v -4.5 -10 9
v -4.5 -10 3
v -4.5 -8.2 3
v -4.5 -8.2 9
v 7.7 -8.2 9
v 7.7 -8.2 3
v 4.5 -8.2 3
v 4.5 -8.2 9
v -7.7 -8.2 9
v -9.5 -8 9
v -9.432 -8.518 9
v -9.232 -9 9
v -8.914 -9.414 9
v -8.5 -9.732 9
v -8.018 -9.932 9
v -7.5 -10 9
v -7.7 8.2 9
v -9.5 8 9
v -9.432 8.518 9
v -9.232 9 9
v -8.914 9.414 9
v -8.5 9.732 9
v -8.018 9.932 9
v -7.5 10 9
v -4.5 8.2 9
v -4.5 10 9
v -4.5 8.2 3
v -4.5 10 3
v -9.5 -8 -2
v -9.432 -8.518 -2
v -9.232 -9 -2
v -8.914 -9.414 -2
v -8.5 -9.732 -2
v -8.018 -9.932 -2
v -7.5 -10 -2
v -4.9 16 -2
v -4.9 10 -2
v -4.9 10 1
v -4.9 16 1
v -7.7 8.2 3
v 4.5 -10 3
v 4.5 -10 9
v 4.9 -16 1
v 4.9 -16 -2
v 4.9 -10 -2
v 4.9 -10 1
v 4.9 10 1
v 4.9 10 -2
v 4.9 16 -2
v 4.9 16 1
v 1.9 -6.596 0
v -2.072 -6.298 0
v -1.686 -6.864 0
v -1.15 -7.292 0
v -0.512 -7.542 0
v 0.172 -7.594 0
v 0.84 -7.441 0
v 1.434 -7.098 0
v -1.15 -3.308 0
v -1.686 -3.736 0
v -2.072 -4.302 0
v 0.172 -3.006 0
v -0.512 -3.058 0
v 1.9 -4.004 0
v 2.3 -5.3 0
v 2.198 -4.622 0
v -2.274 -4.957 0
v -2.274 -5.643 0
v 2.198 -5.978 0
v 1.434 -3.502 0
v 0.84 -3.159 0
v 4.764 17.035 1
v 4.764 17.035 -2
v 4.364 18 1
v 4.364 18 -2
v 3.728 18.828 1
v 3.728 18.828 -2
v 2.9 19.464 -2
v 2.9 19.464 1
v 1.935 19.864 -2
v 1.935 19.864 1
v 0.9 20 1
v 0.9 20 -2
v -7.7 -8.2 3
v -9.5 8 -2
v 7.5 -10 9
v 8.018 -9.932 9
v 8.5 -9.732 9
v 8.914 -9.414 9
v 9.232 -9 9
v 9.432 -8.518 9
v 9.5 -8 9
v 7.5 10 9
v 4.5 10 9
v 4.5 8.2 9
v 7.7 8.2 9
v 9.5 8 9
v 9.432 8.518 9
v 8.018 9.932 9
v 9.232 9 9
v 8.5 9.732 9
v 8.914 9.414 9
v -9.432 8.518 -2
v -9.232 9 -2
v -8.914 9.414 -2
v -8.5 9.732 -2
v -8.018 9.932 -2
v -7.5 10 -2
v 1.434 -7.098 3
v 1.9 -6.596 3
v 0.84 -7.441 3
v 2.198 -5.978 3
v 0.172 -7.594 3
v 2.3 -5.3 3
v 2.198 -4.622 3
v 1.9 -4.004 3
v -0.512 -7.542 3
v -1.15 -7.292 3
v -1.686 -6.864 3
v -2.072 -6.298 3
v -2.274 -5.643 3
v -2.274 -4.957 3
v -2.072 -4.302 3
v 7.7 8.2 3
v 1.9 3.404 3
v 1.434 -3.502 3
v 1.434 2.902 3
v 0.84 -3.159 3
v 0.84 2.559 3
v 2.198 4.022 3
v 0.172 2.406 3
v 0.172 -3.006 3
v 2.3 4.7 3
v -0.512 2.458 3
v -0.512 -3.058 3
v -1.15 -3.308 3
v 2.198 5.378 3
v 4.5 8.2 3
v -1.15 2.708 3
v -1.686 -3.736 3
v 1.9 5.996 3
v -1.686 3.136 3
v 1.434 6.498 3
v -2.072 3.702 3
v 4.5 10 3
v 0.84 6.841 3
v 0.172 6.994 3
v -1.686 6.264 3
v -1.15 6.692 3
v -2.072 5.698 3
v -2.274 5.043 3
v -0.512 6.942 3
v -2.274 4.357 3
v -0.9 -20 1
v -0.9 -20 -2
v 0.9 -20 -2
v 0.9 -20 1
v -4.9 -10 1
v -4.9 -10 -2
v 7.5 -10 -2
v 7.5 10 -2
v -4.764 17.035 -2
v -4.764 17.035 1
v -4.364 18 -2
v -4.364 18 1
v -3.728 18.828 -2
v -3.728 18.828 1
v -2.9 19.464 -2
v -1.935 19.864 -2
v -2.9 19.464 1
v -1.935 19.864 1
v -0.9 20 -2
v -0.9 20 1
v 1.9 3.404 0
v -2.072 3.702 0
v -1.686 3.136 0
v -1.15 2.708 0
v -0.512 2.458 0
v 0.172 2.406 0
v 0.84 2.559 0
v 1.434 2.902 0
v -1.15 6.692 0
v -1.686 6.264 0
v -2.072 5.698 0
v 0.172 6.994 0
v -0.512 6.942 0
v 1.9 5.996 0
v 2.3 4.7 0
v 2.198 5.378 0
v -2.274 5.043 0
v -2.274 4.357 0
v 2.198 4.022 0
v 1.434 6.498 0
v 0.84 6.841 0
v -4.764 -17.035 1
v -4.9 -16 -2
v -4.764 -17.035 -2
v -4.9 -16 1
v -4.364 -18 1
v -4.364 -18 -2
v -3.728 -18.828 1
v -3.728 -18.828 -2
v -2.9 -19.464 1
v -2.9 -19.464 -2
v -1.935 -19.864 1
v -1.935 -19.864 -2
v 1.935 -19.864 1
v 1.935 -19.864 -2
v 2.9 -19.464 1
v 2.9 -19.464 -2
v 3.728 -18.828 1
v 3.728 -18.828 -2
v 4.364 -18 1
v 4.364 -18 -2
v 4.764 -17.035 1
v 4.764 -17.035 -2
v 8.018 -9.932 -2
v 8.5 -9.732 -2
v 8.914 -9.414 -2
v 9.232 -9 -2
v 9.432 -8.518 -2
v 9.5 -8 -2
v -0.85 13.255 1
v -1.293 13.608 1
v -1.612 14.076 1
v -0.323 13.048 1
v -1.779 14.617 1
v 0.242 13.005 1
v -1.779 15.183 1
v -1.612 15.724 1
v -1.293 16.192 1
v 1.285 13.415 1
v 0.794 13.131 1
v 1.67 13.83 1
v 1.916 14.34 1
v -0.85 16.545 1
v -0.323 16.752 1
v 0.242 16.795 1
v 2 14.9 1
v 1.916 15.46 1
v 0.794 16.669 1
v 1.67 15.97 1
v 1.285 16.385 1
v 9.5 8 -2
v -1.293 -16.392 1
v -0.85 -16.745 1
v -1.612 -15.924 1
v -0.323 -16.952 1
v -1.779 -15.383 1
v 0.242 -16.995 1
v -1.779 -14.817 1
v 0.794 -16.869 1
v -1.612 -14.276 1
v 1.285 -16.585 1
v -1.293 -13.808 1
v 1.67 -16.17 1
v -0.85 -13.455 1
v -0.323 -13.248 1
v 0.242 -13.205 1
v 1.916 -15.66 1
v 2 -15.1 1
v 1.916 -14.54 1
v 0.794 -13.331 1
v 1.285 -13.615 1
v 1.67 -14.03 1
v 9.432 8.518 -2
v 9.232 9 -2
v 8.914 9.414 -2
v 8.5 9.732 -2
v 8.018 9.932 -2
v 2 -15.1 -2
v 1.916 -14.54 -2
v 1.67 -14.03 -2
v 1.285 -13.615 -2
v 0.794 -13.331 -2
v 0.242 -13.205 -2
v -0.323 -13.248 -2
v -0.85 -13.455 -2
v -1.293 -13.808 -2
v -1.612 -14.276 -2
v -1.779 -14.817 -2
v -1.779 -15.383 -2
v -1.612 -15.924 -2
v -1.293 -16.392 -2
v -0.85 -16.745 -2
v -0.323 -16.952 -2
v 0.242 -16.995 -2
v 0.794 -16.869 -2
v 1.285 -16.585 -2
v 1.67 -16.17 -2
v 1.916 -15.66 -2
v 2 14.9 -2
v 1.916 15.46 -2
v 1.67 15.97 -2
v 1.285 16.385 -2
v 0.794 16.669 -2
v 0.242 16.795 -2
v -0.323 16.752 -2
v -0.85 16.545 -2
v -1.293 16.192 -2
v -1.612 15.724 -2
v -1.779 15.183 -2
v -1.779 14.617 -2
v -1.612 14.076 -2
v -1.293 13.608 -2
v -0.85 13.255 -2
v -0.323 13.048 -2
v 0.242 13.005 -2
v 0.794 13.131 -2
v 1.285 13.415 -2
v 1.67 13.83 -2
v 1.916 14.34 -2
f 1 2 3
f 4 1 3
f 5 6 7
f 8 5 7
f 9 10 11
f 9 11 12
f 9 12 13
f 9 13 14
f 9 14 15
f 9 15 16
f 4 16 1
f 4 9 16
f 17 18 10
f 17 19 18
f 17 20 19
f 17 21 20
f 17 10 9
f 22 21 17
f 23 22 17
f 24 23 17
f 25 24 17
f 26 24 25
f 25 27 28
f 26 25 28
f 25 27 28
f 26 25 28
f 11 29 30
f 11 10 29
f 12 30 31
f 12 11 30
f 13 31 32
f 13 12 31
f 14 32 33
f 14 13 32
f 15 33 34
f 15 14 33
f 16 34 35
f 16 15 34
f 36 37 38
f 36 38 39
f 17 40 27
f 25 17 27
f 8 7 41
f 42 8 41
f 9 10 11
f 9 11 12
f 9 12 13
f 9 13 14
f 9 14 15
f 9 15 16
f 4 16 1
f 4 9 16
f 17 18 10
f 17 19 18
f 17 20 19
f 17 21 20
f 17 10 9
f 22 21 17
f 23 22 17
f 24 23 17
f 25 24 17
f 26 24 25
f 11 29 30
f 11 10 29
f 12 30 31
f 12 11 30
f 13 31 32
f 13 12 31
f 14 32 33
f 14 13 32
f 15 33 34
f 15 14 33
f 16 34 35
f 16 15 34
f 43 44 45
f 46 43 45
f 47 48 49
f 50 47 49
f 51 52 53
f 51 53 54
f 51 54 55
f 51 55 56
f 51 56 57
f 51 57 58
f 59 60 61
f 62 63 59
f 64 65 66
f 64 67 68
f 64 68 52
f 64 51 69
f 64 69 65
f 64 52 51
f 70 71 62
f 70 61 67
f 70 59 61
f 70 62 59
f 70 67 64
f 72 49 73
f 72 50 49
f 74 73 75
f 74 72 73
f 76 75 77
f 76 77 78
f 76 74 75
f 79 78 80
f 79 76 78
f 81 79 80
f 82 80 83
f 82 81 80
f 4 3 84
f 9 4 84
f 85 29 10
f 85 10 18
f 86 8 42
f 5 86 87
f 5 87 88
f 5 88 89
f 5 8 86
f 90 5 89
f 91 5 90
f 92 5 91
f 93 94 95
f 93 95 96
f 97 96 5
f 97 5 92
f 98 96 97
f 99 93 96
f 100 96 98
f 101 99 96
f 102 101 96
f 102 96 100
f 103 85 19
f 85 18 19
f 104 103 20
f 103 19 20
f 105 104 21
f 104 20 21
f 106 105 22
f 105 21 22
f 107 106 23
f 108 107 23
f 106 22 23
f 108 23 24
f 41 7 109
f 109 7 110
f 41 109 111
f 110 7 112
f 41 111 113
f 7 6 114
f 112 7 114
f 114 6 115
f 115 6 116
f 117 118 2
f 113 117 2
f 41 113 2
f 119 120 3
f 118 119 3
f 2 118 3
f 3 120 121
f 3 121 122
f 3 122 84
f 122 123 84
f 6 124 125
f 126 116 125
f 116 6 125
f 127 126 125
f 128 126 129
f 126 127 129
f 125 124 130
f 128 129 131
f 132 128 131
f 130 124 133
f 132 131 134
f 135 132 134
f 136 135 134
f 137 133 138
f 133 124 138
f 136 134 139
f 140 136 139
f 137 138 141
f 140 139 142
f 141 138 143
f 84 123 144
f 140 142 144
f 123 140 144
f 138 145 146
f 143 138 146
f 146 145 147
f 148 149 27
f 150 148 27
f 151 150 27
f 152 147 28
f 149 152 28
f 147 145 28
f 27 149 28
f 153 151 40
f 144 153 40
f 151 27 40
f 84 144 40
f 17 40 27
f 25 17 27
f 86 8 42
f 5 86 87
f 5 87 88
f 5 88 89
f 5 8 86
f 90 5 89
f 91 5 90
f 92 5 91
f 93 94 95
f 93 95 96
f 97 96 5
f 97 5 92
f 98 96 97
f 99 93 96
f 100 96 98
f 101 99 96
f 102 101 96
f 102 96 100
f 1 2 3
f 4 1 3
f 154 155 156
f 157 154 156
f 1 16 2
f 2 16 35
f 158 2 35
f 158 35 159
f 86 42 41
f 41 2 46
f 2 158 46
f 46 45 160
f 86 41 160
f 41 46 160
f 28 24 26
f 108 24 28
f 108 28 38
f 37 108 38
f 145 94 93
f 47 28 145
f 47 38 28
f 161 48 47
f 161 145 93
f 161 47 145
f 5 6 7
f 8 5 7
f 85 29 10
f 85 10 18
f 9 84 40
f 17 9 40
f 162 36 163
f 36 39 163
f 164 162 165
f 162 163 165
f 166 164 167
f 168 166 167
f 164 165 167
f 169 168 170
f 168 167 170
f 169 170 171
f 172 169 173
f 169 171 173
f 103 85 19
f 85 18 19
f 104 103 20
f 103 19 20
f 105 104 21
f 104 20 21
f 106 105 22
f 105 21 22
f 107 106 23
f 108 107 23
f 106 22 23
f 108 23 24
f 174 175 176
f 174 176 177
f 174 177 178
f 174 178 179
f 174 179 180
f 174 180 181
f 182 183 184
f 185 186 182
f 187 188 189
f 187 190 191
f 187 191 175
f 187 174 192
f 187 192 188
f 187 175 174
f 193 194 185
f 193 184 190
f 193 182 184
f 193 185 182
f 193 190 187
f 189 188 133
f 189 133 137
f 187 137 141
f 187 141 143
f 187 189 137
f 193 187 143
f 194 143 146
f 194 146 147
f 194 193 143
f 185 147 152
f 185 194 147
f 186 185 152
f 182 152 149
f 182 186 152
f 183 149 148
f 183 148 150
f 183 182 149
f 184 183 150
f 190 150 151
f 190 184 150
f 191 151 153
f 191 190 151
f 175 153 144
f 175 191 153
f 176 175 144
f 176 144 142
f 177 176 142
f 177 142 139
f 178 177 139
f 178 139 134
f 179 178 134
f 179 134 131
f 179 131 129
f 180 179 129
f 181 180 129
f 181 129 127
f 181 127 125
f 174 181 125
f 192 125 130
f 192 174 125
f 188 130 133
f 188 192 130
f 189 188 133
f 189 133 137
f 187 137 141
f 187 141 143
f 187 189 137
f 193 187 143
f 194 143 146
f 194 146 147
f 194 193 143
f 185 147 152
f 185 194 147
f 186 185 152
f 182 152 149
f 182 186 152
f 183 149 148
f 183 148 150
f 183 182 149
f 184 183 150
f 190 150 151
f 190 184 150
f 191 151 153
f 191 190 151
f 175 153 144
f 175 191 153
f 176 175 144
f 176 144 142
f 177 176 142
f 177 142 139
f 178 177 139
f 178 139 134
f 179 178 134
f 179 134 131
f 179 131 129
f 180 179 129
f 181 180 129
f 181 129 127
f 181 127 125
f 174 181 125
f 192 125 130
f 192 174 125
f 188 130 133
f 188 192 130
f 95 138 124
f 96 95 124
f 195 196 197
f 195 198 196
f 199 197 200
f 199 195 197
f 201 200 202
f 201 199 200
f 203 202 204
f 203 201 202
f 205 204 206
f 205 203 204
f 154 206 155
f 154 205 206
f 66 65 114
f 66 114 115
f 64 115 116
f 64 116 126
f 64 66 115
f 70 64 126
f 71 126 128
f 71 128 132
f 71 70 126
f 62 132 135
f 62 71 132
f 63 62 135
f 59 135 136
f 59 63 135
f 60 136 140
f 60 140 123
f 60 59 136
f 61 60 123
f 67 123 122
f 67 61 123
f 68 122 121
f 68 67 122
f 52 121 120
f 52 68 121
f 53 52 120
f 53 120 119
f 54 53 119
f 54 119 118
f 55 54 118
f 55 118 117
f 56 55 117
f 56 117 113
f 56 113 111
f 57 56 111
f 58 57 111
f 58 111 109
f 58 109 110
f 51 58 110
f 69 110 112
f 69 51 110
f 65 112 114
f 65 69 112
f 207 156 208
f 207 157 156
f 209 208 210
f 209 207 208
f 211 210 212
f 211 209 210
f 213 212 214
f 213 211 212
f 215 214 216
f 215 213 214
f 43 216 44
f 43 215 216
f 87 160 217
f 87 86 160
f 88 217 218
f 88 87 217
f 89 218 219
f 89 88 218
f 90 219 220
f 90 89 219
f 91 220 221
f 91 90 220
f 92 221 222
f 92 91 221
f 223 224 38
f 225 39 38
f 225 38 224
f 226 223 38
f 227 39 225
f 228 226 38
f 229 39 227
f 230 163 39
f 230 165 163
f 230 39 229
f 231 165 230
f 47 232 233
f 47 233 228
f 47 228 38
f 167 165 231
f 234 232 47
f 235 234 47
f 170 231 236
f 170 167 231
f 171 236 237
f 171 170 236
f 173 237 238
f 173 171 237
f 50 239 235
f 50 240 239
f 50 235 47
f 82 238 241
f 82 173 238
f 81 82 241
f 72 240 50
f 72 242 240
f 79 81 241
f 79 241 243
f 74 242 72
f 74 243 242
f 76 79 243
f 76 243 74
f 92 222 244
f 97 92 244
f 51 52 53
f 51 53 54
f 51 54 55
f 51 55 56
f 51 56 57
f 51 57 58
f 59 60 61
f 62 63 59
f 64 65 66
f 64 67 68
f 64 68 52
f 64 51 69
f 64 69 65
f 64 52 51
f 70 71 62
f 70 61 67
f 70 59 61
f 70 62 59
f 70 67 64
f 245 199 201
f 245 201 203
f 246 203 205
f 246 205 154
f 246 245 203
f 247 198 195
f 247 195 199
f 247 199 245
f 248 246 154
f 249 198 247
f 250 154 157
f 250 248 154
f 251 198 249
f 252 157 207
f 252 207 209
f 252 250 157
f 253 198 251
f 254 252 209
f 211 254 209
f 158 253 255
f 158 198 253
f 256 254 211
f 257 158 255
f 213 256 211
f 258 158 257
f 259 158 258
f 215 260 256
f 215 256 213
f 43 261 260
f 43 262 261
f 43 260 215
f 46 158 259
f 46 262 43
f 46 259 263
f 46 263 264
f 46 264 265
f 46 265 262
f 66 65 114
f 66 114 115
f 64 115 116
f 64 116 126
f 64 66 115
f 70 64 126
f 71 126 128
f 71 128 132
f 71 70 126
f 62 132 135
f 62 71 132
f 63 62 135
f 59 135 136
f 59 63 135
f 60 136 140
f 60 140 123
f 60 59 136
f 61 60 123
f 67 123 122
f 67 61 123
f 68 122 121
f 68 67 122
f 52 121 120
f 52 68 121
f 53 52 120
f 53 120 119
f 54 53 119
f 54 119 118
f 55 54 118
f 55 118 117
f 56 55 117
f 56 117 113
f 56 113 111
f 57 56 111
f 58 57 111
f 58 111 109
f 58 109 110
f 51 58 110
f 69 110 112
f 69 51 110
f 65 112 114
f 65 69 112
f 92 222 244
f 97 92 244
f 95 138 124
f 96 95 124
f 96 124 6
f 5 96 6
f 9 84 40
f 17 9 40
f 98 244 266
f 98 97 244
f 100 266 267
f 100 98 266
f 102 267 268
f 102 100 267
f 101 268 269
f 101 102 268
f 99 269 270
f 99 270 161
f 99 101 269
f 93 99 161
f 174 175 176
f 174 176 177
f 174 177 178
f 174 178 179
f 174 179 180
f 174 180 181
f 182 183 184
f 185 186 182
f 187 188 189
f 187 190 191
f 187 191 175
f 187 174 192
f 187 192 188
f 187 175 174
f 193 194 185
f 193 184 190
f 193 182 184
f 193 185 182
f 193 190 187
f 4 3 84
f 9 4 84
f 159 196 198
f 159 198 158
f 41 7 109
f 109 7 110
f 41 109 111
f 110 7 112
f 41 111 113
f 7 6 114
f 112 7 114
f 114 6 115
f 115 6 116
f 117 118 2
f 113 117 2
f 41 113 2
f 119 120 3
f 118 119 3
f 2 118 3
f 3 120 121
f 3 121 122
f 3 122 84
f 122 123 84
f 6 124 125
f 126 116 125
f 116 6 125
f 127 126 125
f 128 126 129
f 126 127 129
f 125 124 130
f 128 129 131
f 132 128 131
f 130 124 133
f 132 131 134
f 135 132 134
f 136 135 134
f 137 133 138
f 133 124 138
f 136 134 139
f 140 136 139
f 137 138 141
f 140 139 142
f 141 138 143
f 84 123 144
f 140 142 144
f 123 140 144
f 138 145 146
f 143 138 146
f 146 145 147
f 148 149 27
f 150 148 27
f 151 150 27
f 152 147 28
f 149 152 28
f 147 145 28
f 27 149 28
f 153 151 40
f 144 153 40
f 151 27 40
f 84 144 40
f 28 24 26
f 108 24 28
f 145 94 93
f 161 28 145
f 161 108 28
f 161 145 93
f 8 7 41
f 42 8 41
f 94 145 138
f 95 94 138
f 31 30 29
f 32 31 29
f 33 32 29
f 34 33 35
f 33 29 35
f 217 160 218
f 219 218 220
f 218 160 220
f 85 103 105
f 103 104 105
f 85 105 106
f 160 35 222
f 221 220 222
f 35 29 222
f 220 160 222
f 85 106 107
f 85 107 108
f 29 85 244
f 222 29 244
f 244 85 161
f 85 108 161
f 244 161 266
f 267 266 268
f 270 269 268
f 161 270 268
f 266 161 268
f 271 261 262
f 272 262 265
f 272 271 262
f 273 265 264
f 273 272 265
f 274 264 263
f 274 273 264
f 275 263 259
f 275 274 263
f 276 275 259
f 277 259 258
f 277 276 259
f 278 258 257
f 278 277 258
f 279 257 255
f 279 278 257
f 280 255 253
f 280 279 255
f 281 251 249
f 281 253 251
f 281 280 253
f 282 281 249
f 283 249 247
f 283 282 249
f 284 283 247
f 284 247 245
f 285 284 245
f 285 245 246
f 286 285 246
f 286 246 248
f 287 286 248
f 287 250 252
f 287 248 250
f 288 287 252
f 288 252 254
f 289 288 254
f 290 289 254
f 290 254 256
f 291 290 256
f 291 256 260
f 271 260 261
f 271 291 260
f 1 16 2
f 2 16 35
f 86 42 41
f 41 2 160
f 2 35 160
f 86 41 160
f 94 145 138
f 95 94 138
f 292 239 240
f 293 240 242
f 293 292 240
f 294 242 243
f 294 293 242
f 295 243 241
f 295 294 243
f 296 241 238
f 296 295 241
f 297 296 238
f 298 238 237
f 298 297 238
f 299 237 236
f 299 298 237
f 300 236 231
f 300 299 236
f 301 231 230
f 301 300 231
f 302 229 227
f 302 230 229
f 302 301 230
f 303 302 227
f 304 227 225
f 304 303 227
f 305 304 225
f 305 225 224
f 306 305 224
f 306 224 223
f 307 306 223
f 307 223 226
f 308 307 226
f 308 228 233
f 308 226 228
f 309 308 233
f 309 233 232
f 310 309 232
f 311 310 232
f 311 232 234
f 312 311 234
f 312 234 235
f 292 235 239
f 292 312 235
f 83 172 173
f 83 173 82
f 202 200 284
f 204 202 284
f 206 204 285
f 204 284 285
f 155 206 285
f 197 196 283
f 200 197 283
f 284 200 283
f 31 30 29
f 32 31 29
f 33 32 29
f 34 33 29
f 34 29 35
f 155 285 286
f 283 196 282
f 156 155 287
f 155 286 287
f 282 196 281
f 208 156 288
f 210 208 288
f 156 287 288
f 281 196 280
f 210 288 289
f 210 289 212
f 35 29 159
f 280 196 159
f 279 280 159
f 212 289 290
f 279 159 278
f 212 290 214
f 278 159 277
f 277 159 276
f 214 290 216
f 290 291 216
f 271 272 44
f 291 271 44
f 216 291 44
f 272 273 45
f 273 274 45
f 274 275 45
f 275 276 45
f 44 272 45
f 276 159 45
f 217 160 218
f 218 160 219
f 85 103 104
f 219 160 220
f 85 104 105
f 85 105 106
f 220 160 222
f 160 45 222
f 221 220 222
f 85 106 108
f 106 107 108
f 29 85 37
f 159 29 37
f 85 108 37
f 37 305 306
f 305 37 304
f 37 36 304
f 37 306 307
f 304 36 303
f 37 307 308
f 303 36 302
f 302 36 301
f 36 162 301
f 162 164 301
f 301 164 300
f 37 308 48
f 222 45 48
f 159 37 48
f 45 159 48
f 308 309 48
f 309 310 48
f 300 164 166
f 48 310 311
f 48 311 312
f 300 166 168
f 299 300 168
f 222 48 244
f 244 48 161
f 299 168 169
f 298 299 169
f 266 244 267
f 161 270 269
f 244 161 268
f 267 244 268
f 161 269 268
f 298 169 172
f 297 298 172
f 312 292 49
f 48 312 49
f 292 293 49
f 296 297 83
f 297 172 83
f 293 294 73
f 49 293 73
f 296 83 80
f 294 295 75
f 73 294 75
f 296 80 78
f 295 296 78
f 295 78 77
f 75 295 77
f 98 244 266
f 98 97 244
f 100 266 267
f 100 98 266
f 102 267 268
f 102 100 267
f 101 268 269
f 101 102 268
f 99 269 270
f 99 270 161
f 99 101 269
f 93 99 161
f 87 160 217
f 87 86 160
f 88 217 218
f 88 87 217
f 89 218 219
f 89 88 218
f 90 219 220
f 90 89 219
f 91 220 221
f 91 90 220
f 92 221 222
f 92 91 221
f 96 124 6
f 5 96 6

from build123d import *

# Parameters (mm, degrees)
PAD_DEPTH         = 10
CYLINDER_R        = 2.3
CYLINDER_DEPTH    = 3
ARRAY_Y_COUNT     = 2
ARRAY_Y_PITCH     = 10
BOX_W             = 19
BOX_H             = 20
BOX_DEPTH         = 11
FILLET_R          = 2
CYLINDER001_R     = 1.9
CYLINDER001_DEPTH = 10
ARRAY002_Y_COUNT  = 2
ARRAY002_Y_PITCH  = 30
BOX005_W          = 9.8
BOX005_H          = 40
BOX005_DEPTH      = 3
FILLET002_R       = 4


with BuildPart() as tiny_bb_body:
    # Sketch → Pad (new body)
    with BuildSketch(Plane.XY):
        Polygon((-4.5, 10.3), (4.5, 10.3), (4.5, 8.2), (7.7, 8.2), (7.7, -8.2), (4.5, -8.2), (4.5, -10.3), (-4.5, -10.3), (-4.5, -8.2), (-7.7, -8.2), (-7.7, 8.2), (-4.5, 8.2), align=None)
    extrude(amount=PAD_DEPTH)


with BuildPart() as tiny_bb_body_1:
    # Body placement: moved
    add(tiny_bb_body.part.moved(Location((0, 0, 3))))


with BuildPart() as tiny_bb_mockup:
    # Cylinder → Cylinder (new body)
    with BuildSketch(Plane.XY):
        Circle(CYLINDER_R)
    extrude(amount=CYLINDER_DEPTH)

    # Array Y: tiny bb mockup ×2


with BuildPart() as tiny_bb_mockup_1:
    add(tiny_bb_mockup.part)
    with Locations(*[(0, i * ARRAY_Y_PITCH, 0) for i in range(1, ARRAY_Y_COUNT)]):
        add(tiny_bb_mockup.part)


with BuildPart() as tiny_bb_mockup_2:
    # Array placement: moved
    add(tiny_bb_mockup_1.part.moved(Location((0, -5.3, 0))))

    # Fusion: union tiny bb body
    add(tiny_bb_body_1.part)


with BuildPart() as bb_box_fillet:
    # Box → Box (new body)
    with BuildSketch(Plane(origin=(-9.5, -10, -2), x_dir=(1, 0, 0), z_dir=(0, 0, 1))):
        with Locations((9.5, 10)):
            Rectangle(BOX_W, BOX_H)
    extrude(amount=BOX_DEPTH)

    # Fillet
    fillet_edges = [bb_box_fillet.edges().sort_by_distance(p)[0] for p in [
        (-9.5, -10, 3.5),
        (-9.5, 10, 3.5),
        (9.5, -10, 3.5),
        (9.5, 10, 3.5),
    ]]
    fillet(fillet_edges, radius=FILLET_R)


with BuildPart() as attach_hole_array:
    # Cylinder001 → Cylinder001 (new body)
    with BuildSketch(Plane(origin=(5, 4.9, 0), x_dir=(1, 0, 0), z_dir=(0, 0, 1))):
        Circle(CYLINDER001_R)
    extrude(amount=CYLINDER001_DEPTH)

    # Array002 Y: attach hole array ×2


with BuildPart() as attach_hole_array_1:
    add(attach_hole_array.part)
    with Locations(*[(0, i * ARRAY002_Y_PITCH, 0) for i in range(1, ARRAY002_Y_COUNT)]):
        add(attach_hole_array.part)


with BuildPart() as bb_box_cut:
    # Box005 → Box005 (new body)
    with BuildSketch(Plane.XY):
        with Locations((4.9, 20)):
            Rectangle(BOX005_W, BOX005_H)
    extrude(amount=BOX005_DEPTH)

    # Fillet002
    fillet002_edges = [bb_box_cut.edges().sort_by_distance(p)[0] for p in [
        (0, 0, 1.5),
        (0, 40, 1.5),
        (9.8, 0, 1.5),
        (9.8, 40, 1.5),
    ]]
    fillet(fillet002_edges, radius=FILLET002_R)

    # Cut002: cut attach hole array
    add(attach_hole_array_1.part, mode=Mode.SUBTRACT)


with BuildPart() as bb_box_cut_1:
    # Cut002 placement: moved
    add(bb_box_cut.part.moved(Location((-4.9, -20, -2))))

    # Fusion001: union bb box fillet
    add(bb_box_fillet.part)

    # Cut: cut tiny bb mockup
    add(tiny_bb_mockup_2.part, mode=Mode.SUBTRACT)


with BuildPart() as bb_box_cut001:
    # Cut003 base: copy of bb box fillet
    add(bb_box_fillet.part)

    # Cut003: cut tiny bb mockup
    add(tiny_bb_mockup_2.part, mode=Mode.SUBTRACT)


solid = Compound([bb_box_cut_1.part, bb_box_cut001.part])
